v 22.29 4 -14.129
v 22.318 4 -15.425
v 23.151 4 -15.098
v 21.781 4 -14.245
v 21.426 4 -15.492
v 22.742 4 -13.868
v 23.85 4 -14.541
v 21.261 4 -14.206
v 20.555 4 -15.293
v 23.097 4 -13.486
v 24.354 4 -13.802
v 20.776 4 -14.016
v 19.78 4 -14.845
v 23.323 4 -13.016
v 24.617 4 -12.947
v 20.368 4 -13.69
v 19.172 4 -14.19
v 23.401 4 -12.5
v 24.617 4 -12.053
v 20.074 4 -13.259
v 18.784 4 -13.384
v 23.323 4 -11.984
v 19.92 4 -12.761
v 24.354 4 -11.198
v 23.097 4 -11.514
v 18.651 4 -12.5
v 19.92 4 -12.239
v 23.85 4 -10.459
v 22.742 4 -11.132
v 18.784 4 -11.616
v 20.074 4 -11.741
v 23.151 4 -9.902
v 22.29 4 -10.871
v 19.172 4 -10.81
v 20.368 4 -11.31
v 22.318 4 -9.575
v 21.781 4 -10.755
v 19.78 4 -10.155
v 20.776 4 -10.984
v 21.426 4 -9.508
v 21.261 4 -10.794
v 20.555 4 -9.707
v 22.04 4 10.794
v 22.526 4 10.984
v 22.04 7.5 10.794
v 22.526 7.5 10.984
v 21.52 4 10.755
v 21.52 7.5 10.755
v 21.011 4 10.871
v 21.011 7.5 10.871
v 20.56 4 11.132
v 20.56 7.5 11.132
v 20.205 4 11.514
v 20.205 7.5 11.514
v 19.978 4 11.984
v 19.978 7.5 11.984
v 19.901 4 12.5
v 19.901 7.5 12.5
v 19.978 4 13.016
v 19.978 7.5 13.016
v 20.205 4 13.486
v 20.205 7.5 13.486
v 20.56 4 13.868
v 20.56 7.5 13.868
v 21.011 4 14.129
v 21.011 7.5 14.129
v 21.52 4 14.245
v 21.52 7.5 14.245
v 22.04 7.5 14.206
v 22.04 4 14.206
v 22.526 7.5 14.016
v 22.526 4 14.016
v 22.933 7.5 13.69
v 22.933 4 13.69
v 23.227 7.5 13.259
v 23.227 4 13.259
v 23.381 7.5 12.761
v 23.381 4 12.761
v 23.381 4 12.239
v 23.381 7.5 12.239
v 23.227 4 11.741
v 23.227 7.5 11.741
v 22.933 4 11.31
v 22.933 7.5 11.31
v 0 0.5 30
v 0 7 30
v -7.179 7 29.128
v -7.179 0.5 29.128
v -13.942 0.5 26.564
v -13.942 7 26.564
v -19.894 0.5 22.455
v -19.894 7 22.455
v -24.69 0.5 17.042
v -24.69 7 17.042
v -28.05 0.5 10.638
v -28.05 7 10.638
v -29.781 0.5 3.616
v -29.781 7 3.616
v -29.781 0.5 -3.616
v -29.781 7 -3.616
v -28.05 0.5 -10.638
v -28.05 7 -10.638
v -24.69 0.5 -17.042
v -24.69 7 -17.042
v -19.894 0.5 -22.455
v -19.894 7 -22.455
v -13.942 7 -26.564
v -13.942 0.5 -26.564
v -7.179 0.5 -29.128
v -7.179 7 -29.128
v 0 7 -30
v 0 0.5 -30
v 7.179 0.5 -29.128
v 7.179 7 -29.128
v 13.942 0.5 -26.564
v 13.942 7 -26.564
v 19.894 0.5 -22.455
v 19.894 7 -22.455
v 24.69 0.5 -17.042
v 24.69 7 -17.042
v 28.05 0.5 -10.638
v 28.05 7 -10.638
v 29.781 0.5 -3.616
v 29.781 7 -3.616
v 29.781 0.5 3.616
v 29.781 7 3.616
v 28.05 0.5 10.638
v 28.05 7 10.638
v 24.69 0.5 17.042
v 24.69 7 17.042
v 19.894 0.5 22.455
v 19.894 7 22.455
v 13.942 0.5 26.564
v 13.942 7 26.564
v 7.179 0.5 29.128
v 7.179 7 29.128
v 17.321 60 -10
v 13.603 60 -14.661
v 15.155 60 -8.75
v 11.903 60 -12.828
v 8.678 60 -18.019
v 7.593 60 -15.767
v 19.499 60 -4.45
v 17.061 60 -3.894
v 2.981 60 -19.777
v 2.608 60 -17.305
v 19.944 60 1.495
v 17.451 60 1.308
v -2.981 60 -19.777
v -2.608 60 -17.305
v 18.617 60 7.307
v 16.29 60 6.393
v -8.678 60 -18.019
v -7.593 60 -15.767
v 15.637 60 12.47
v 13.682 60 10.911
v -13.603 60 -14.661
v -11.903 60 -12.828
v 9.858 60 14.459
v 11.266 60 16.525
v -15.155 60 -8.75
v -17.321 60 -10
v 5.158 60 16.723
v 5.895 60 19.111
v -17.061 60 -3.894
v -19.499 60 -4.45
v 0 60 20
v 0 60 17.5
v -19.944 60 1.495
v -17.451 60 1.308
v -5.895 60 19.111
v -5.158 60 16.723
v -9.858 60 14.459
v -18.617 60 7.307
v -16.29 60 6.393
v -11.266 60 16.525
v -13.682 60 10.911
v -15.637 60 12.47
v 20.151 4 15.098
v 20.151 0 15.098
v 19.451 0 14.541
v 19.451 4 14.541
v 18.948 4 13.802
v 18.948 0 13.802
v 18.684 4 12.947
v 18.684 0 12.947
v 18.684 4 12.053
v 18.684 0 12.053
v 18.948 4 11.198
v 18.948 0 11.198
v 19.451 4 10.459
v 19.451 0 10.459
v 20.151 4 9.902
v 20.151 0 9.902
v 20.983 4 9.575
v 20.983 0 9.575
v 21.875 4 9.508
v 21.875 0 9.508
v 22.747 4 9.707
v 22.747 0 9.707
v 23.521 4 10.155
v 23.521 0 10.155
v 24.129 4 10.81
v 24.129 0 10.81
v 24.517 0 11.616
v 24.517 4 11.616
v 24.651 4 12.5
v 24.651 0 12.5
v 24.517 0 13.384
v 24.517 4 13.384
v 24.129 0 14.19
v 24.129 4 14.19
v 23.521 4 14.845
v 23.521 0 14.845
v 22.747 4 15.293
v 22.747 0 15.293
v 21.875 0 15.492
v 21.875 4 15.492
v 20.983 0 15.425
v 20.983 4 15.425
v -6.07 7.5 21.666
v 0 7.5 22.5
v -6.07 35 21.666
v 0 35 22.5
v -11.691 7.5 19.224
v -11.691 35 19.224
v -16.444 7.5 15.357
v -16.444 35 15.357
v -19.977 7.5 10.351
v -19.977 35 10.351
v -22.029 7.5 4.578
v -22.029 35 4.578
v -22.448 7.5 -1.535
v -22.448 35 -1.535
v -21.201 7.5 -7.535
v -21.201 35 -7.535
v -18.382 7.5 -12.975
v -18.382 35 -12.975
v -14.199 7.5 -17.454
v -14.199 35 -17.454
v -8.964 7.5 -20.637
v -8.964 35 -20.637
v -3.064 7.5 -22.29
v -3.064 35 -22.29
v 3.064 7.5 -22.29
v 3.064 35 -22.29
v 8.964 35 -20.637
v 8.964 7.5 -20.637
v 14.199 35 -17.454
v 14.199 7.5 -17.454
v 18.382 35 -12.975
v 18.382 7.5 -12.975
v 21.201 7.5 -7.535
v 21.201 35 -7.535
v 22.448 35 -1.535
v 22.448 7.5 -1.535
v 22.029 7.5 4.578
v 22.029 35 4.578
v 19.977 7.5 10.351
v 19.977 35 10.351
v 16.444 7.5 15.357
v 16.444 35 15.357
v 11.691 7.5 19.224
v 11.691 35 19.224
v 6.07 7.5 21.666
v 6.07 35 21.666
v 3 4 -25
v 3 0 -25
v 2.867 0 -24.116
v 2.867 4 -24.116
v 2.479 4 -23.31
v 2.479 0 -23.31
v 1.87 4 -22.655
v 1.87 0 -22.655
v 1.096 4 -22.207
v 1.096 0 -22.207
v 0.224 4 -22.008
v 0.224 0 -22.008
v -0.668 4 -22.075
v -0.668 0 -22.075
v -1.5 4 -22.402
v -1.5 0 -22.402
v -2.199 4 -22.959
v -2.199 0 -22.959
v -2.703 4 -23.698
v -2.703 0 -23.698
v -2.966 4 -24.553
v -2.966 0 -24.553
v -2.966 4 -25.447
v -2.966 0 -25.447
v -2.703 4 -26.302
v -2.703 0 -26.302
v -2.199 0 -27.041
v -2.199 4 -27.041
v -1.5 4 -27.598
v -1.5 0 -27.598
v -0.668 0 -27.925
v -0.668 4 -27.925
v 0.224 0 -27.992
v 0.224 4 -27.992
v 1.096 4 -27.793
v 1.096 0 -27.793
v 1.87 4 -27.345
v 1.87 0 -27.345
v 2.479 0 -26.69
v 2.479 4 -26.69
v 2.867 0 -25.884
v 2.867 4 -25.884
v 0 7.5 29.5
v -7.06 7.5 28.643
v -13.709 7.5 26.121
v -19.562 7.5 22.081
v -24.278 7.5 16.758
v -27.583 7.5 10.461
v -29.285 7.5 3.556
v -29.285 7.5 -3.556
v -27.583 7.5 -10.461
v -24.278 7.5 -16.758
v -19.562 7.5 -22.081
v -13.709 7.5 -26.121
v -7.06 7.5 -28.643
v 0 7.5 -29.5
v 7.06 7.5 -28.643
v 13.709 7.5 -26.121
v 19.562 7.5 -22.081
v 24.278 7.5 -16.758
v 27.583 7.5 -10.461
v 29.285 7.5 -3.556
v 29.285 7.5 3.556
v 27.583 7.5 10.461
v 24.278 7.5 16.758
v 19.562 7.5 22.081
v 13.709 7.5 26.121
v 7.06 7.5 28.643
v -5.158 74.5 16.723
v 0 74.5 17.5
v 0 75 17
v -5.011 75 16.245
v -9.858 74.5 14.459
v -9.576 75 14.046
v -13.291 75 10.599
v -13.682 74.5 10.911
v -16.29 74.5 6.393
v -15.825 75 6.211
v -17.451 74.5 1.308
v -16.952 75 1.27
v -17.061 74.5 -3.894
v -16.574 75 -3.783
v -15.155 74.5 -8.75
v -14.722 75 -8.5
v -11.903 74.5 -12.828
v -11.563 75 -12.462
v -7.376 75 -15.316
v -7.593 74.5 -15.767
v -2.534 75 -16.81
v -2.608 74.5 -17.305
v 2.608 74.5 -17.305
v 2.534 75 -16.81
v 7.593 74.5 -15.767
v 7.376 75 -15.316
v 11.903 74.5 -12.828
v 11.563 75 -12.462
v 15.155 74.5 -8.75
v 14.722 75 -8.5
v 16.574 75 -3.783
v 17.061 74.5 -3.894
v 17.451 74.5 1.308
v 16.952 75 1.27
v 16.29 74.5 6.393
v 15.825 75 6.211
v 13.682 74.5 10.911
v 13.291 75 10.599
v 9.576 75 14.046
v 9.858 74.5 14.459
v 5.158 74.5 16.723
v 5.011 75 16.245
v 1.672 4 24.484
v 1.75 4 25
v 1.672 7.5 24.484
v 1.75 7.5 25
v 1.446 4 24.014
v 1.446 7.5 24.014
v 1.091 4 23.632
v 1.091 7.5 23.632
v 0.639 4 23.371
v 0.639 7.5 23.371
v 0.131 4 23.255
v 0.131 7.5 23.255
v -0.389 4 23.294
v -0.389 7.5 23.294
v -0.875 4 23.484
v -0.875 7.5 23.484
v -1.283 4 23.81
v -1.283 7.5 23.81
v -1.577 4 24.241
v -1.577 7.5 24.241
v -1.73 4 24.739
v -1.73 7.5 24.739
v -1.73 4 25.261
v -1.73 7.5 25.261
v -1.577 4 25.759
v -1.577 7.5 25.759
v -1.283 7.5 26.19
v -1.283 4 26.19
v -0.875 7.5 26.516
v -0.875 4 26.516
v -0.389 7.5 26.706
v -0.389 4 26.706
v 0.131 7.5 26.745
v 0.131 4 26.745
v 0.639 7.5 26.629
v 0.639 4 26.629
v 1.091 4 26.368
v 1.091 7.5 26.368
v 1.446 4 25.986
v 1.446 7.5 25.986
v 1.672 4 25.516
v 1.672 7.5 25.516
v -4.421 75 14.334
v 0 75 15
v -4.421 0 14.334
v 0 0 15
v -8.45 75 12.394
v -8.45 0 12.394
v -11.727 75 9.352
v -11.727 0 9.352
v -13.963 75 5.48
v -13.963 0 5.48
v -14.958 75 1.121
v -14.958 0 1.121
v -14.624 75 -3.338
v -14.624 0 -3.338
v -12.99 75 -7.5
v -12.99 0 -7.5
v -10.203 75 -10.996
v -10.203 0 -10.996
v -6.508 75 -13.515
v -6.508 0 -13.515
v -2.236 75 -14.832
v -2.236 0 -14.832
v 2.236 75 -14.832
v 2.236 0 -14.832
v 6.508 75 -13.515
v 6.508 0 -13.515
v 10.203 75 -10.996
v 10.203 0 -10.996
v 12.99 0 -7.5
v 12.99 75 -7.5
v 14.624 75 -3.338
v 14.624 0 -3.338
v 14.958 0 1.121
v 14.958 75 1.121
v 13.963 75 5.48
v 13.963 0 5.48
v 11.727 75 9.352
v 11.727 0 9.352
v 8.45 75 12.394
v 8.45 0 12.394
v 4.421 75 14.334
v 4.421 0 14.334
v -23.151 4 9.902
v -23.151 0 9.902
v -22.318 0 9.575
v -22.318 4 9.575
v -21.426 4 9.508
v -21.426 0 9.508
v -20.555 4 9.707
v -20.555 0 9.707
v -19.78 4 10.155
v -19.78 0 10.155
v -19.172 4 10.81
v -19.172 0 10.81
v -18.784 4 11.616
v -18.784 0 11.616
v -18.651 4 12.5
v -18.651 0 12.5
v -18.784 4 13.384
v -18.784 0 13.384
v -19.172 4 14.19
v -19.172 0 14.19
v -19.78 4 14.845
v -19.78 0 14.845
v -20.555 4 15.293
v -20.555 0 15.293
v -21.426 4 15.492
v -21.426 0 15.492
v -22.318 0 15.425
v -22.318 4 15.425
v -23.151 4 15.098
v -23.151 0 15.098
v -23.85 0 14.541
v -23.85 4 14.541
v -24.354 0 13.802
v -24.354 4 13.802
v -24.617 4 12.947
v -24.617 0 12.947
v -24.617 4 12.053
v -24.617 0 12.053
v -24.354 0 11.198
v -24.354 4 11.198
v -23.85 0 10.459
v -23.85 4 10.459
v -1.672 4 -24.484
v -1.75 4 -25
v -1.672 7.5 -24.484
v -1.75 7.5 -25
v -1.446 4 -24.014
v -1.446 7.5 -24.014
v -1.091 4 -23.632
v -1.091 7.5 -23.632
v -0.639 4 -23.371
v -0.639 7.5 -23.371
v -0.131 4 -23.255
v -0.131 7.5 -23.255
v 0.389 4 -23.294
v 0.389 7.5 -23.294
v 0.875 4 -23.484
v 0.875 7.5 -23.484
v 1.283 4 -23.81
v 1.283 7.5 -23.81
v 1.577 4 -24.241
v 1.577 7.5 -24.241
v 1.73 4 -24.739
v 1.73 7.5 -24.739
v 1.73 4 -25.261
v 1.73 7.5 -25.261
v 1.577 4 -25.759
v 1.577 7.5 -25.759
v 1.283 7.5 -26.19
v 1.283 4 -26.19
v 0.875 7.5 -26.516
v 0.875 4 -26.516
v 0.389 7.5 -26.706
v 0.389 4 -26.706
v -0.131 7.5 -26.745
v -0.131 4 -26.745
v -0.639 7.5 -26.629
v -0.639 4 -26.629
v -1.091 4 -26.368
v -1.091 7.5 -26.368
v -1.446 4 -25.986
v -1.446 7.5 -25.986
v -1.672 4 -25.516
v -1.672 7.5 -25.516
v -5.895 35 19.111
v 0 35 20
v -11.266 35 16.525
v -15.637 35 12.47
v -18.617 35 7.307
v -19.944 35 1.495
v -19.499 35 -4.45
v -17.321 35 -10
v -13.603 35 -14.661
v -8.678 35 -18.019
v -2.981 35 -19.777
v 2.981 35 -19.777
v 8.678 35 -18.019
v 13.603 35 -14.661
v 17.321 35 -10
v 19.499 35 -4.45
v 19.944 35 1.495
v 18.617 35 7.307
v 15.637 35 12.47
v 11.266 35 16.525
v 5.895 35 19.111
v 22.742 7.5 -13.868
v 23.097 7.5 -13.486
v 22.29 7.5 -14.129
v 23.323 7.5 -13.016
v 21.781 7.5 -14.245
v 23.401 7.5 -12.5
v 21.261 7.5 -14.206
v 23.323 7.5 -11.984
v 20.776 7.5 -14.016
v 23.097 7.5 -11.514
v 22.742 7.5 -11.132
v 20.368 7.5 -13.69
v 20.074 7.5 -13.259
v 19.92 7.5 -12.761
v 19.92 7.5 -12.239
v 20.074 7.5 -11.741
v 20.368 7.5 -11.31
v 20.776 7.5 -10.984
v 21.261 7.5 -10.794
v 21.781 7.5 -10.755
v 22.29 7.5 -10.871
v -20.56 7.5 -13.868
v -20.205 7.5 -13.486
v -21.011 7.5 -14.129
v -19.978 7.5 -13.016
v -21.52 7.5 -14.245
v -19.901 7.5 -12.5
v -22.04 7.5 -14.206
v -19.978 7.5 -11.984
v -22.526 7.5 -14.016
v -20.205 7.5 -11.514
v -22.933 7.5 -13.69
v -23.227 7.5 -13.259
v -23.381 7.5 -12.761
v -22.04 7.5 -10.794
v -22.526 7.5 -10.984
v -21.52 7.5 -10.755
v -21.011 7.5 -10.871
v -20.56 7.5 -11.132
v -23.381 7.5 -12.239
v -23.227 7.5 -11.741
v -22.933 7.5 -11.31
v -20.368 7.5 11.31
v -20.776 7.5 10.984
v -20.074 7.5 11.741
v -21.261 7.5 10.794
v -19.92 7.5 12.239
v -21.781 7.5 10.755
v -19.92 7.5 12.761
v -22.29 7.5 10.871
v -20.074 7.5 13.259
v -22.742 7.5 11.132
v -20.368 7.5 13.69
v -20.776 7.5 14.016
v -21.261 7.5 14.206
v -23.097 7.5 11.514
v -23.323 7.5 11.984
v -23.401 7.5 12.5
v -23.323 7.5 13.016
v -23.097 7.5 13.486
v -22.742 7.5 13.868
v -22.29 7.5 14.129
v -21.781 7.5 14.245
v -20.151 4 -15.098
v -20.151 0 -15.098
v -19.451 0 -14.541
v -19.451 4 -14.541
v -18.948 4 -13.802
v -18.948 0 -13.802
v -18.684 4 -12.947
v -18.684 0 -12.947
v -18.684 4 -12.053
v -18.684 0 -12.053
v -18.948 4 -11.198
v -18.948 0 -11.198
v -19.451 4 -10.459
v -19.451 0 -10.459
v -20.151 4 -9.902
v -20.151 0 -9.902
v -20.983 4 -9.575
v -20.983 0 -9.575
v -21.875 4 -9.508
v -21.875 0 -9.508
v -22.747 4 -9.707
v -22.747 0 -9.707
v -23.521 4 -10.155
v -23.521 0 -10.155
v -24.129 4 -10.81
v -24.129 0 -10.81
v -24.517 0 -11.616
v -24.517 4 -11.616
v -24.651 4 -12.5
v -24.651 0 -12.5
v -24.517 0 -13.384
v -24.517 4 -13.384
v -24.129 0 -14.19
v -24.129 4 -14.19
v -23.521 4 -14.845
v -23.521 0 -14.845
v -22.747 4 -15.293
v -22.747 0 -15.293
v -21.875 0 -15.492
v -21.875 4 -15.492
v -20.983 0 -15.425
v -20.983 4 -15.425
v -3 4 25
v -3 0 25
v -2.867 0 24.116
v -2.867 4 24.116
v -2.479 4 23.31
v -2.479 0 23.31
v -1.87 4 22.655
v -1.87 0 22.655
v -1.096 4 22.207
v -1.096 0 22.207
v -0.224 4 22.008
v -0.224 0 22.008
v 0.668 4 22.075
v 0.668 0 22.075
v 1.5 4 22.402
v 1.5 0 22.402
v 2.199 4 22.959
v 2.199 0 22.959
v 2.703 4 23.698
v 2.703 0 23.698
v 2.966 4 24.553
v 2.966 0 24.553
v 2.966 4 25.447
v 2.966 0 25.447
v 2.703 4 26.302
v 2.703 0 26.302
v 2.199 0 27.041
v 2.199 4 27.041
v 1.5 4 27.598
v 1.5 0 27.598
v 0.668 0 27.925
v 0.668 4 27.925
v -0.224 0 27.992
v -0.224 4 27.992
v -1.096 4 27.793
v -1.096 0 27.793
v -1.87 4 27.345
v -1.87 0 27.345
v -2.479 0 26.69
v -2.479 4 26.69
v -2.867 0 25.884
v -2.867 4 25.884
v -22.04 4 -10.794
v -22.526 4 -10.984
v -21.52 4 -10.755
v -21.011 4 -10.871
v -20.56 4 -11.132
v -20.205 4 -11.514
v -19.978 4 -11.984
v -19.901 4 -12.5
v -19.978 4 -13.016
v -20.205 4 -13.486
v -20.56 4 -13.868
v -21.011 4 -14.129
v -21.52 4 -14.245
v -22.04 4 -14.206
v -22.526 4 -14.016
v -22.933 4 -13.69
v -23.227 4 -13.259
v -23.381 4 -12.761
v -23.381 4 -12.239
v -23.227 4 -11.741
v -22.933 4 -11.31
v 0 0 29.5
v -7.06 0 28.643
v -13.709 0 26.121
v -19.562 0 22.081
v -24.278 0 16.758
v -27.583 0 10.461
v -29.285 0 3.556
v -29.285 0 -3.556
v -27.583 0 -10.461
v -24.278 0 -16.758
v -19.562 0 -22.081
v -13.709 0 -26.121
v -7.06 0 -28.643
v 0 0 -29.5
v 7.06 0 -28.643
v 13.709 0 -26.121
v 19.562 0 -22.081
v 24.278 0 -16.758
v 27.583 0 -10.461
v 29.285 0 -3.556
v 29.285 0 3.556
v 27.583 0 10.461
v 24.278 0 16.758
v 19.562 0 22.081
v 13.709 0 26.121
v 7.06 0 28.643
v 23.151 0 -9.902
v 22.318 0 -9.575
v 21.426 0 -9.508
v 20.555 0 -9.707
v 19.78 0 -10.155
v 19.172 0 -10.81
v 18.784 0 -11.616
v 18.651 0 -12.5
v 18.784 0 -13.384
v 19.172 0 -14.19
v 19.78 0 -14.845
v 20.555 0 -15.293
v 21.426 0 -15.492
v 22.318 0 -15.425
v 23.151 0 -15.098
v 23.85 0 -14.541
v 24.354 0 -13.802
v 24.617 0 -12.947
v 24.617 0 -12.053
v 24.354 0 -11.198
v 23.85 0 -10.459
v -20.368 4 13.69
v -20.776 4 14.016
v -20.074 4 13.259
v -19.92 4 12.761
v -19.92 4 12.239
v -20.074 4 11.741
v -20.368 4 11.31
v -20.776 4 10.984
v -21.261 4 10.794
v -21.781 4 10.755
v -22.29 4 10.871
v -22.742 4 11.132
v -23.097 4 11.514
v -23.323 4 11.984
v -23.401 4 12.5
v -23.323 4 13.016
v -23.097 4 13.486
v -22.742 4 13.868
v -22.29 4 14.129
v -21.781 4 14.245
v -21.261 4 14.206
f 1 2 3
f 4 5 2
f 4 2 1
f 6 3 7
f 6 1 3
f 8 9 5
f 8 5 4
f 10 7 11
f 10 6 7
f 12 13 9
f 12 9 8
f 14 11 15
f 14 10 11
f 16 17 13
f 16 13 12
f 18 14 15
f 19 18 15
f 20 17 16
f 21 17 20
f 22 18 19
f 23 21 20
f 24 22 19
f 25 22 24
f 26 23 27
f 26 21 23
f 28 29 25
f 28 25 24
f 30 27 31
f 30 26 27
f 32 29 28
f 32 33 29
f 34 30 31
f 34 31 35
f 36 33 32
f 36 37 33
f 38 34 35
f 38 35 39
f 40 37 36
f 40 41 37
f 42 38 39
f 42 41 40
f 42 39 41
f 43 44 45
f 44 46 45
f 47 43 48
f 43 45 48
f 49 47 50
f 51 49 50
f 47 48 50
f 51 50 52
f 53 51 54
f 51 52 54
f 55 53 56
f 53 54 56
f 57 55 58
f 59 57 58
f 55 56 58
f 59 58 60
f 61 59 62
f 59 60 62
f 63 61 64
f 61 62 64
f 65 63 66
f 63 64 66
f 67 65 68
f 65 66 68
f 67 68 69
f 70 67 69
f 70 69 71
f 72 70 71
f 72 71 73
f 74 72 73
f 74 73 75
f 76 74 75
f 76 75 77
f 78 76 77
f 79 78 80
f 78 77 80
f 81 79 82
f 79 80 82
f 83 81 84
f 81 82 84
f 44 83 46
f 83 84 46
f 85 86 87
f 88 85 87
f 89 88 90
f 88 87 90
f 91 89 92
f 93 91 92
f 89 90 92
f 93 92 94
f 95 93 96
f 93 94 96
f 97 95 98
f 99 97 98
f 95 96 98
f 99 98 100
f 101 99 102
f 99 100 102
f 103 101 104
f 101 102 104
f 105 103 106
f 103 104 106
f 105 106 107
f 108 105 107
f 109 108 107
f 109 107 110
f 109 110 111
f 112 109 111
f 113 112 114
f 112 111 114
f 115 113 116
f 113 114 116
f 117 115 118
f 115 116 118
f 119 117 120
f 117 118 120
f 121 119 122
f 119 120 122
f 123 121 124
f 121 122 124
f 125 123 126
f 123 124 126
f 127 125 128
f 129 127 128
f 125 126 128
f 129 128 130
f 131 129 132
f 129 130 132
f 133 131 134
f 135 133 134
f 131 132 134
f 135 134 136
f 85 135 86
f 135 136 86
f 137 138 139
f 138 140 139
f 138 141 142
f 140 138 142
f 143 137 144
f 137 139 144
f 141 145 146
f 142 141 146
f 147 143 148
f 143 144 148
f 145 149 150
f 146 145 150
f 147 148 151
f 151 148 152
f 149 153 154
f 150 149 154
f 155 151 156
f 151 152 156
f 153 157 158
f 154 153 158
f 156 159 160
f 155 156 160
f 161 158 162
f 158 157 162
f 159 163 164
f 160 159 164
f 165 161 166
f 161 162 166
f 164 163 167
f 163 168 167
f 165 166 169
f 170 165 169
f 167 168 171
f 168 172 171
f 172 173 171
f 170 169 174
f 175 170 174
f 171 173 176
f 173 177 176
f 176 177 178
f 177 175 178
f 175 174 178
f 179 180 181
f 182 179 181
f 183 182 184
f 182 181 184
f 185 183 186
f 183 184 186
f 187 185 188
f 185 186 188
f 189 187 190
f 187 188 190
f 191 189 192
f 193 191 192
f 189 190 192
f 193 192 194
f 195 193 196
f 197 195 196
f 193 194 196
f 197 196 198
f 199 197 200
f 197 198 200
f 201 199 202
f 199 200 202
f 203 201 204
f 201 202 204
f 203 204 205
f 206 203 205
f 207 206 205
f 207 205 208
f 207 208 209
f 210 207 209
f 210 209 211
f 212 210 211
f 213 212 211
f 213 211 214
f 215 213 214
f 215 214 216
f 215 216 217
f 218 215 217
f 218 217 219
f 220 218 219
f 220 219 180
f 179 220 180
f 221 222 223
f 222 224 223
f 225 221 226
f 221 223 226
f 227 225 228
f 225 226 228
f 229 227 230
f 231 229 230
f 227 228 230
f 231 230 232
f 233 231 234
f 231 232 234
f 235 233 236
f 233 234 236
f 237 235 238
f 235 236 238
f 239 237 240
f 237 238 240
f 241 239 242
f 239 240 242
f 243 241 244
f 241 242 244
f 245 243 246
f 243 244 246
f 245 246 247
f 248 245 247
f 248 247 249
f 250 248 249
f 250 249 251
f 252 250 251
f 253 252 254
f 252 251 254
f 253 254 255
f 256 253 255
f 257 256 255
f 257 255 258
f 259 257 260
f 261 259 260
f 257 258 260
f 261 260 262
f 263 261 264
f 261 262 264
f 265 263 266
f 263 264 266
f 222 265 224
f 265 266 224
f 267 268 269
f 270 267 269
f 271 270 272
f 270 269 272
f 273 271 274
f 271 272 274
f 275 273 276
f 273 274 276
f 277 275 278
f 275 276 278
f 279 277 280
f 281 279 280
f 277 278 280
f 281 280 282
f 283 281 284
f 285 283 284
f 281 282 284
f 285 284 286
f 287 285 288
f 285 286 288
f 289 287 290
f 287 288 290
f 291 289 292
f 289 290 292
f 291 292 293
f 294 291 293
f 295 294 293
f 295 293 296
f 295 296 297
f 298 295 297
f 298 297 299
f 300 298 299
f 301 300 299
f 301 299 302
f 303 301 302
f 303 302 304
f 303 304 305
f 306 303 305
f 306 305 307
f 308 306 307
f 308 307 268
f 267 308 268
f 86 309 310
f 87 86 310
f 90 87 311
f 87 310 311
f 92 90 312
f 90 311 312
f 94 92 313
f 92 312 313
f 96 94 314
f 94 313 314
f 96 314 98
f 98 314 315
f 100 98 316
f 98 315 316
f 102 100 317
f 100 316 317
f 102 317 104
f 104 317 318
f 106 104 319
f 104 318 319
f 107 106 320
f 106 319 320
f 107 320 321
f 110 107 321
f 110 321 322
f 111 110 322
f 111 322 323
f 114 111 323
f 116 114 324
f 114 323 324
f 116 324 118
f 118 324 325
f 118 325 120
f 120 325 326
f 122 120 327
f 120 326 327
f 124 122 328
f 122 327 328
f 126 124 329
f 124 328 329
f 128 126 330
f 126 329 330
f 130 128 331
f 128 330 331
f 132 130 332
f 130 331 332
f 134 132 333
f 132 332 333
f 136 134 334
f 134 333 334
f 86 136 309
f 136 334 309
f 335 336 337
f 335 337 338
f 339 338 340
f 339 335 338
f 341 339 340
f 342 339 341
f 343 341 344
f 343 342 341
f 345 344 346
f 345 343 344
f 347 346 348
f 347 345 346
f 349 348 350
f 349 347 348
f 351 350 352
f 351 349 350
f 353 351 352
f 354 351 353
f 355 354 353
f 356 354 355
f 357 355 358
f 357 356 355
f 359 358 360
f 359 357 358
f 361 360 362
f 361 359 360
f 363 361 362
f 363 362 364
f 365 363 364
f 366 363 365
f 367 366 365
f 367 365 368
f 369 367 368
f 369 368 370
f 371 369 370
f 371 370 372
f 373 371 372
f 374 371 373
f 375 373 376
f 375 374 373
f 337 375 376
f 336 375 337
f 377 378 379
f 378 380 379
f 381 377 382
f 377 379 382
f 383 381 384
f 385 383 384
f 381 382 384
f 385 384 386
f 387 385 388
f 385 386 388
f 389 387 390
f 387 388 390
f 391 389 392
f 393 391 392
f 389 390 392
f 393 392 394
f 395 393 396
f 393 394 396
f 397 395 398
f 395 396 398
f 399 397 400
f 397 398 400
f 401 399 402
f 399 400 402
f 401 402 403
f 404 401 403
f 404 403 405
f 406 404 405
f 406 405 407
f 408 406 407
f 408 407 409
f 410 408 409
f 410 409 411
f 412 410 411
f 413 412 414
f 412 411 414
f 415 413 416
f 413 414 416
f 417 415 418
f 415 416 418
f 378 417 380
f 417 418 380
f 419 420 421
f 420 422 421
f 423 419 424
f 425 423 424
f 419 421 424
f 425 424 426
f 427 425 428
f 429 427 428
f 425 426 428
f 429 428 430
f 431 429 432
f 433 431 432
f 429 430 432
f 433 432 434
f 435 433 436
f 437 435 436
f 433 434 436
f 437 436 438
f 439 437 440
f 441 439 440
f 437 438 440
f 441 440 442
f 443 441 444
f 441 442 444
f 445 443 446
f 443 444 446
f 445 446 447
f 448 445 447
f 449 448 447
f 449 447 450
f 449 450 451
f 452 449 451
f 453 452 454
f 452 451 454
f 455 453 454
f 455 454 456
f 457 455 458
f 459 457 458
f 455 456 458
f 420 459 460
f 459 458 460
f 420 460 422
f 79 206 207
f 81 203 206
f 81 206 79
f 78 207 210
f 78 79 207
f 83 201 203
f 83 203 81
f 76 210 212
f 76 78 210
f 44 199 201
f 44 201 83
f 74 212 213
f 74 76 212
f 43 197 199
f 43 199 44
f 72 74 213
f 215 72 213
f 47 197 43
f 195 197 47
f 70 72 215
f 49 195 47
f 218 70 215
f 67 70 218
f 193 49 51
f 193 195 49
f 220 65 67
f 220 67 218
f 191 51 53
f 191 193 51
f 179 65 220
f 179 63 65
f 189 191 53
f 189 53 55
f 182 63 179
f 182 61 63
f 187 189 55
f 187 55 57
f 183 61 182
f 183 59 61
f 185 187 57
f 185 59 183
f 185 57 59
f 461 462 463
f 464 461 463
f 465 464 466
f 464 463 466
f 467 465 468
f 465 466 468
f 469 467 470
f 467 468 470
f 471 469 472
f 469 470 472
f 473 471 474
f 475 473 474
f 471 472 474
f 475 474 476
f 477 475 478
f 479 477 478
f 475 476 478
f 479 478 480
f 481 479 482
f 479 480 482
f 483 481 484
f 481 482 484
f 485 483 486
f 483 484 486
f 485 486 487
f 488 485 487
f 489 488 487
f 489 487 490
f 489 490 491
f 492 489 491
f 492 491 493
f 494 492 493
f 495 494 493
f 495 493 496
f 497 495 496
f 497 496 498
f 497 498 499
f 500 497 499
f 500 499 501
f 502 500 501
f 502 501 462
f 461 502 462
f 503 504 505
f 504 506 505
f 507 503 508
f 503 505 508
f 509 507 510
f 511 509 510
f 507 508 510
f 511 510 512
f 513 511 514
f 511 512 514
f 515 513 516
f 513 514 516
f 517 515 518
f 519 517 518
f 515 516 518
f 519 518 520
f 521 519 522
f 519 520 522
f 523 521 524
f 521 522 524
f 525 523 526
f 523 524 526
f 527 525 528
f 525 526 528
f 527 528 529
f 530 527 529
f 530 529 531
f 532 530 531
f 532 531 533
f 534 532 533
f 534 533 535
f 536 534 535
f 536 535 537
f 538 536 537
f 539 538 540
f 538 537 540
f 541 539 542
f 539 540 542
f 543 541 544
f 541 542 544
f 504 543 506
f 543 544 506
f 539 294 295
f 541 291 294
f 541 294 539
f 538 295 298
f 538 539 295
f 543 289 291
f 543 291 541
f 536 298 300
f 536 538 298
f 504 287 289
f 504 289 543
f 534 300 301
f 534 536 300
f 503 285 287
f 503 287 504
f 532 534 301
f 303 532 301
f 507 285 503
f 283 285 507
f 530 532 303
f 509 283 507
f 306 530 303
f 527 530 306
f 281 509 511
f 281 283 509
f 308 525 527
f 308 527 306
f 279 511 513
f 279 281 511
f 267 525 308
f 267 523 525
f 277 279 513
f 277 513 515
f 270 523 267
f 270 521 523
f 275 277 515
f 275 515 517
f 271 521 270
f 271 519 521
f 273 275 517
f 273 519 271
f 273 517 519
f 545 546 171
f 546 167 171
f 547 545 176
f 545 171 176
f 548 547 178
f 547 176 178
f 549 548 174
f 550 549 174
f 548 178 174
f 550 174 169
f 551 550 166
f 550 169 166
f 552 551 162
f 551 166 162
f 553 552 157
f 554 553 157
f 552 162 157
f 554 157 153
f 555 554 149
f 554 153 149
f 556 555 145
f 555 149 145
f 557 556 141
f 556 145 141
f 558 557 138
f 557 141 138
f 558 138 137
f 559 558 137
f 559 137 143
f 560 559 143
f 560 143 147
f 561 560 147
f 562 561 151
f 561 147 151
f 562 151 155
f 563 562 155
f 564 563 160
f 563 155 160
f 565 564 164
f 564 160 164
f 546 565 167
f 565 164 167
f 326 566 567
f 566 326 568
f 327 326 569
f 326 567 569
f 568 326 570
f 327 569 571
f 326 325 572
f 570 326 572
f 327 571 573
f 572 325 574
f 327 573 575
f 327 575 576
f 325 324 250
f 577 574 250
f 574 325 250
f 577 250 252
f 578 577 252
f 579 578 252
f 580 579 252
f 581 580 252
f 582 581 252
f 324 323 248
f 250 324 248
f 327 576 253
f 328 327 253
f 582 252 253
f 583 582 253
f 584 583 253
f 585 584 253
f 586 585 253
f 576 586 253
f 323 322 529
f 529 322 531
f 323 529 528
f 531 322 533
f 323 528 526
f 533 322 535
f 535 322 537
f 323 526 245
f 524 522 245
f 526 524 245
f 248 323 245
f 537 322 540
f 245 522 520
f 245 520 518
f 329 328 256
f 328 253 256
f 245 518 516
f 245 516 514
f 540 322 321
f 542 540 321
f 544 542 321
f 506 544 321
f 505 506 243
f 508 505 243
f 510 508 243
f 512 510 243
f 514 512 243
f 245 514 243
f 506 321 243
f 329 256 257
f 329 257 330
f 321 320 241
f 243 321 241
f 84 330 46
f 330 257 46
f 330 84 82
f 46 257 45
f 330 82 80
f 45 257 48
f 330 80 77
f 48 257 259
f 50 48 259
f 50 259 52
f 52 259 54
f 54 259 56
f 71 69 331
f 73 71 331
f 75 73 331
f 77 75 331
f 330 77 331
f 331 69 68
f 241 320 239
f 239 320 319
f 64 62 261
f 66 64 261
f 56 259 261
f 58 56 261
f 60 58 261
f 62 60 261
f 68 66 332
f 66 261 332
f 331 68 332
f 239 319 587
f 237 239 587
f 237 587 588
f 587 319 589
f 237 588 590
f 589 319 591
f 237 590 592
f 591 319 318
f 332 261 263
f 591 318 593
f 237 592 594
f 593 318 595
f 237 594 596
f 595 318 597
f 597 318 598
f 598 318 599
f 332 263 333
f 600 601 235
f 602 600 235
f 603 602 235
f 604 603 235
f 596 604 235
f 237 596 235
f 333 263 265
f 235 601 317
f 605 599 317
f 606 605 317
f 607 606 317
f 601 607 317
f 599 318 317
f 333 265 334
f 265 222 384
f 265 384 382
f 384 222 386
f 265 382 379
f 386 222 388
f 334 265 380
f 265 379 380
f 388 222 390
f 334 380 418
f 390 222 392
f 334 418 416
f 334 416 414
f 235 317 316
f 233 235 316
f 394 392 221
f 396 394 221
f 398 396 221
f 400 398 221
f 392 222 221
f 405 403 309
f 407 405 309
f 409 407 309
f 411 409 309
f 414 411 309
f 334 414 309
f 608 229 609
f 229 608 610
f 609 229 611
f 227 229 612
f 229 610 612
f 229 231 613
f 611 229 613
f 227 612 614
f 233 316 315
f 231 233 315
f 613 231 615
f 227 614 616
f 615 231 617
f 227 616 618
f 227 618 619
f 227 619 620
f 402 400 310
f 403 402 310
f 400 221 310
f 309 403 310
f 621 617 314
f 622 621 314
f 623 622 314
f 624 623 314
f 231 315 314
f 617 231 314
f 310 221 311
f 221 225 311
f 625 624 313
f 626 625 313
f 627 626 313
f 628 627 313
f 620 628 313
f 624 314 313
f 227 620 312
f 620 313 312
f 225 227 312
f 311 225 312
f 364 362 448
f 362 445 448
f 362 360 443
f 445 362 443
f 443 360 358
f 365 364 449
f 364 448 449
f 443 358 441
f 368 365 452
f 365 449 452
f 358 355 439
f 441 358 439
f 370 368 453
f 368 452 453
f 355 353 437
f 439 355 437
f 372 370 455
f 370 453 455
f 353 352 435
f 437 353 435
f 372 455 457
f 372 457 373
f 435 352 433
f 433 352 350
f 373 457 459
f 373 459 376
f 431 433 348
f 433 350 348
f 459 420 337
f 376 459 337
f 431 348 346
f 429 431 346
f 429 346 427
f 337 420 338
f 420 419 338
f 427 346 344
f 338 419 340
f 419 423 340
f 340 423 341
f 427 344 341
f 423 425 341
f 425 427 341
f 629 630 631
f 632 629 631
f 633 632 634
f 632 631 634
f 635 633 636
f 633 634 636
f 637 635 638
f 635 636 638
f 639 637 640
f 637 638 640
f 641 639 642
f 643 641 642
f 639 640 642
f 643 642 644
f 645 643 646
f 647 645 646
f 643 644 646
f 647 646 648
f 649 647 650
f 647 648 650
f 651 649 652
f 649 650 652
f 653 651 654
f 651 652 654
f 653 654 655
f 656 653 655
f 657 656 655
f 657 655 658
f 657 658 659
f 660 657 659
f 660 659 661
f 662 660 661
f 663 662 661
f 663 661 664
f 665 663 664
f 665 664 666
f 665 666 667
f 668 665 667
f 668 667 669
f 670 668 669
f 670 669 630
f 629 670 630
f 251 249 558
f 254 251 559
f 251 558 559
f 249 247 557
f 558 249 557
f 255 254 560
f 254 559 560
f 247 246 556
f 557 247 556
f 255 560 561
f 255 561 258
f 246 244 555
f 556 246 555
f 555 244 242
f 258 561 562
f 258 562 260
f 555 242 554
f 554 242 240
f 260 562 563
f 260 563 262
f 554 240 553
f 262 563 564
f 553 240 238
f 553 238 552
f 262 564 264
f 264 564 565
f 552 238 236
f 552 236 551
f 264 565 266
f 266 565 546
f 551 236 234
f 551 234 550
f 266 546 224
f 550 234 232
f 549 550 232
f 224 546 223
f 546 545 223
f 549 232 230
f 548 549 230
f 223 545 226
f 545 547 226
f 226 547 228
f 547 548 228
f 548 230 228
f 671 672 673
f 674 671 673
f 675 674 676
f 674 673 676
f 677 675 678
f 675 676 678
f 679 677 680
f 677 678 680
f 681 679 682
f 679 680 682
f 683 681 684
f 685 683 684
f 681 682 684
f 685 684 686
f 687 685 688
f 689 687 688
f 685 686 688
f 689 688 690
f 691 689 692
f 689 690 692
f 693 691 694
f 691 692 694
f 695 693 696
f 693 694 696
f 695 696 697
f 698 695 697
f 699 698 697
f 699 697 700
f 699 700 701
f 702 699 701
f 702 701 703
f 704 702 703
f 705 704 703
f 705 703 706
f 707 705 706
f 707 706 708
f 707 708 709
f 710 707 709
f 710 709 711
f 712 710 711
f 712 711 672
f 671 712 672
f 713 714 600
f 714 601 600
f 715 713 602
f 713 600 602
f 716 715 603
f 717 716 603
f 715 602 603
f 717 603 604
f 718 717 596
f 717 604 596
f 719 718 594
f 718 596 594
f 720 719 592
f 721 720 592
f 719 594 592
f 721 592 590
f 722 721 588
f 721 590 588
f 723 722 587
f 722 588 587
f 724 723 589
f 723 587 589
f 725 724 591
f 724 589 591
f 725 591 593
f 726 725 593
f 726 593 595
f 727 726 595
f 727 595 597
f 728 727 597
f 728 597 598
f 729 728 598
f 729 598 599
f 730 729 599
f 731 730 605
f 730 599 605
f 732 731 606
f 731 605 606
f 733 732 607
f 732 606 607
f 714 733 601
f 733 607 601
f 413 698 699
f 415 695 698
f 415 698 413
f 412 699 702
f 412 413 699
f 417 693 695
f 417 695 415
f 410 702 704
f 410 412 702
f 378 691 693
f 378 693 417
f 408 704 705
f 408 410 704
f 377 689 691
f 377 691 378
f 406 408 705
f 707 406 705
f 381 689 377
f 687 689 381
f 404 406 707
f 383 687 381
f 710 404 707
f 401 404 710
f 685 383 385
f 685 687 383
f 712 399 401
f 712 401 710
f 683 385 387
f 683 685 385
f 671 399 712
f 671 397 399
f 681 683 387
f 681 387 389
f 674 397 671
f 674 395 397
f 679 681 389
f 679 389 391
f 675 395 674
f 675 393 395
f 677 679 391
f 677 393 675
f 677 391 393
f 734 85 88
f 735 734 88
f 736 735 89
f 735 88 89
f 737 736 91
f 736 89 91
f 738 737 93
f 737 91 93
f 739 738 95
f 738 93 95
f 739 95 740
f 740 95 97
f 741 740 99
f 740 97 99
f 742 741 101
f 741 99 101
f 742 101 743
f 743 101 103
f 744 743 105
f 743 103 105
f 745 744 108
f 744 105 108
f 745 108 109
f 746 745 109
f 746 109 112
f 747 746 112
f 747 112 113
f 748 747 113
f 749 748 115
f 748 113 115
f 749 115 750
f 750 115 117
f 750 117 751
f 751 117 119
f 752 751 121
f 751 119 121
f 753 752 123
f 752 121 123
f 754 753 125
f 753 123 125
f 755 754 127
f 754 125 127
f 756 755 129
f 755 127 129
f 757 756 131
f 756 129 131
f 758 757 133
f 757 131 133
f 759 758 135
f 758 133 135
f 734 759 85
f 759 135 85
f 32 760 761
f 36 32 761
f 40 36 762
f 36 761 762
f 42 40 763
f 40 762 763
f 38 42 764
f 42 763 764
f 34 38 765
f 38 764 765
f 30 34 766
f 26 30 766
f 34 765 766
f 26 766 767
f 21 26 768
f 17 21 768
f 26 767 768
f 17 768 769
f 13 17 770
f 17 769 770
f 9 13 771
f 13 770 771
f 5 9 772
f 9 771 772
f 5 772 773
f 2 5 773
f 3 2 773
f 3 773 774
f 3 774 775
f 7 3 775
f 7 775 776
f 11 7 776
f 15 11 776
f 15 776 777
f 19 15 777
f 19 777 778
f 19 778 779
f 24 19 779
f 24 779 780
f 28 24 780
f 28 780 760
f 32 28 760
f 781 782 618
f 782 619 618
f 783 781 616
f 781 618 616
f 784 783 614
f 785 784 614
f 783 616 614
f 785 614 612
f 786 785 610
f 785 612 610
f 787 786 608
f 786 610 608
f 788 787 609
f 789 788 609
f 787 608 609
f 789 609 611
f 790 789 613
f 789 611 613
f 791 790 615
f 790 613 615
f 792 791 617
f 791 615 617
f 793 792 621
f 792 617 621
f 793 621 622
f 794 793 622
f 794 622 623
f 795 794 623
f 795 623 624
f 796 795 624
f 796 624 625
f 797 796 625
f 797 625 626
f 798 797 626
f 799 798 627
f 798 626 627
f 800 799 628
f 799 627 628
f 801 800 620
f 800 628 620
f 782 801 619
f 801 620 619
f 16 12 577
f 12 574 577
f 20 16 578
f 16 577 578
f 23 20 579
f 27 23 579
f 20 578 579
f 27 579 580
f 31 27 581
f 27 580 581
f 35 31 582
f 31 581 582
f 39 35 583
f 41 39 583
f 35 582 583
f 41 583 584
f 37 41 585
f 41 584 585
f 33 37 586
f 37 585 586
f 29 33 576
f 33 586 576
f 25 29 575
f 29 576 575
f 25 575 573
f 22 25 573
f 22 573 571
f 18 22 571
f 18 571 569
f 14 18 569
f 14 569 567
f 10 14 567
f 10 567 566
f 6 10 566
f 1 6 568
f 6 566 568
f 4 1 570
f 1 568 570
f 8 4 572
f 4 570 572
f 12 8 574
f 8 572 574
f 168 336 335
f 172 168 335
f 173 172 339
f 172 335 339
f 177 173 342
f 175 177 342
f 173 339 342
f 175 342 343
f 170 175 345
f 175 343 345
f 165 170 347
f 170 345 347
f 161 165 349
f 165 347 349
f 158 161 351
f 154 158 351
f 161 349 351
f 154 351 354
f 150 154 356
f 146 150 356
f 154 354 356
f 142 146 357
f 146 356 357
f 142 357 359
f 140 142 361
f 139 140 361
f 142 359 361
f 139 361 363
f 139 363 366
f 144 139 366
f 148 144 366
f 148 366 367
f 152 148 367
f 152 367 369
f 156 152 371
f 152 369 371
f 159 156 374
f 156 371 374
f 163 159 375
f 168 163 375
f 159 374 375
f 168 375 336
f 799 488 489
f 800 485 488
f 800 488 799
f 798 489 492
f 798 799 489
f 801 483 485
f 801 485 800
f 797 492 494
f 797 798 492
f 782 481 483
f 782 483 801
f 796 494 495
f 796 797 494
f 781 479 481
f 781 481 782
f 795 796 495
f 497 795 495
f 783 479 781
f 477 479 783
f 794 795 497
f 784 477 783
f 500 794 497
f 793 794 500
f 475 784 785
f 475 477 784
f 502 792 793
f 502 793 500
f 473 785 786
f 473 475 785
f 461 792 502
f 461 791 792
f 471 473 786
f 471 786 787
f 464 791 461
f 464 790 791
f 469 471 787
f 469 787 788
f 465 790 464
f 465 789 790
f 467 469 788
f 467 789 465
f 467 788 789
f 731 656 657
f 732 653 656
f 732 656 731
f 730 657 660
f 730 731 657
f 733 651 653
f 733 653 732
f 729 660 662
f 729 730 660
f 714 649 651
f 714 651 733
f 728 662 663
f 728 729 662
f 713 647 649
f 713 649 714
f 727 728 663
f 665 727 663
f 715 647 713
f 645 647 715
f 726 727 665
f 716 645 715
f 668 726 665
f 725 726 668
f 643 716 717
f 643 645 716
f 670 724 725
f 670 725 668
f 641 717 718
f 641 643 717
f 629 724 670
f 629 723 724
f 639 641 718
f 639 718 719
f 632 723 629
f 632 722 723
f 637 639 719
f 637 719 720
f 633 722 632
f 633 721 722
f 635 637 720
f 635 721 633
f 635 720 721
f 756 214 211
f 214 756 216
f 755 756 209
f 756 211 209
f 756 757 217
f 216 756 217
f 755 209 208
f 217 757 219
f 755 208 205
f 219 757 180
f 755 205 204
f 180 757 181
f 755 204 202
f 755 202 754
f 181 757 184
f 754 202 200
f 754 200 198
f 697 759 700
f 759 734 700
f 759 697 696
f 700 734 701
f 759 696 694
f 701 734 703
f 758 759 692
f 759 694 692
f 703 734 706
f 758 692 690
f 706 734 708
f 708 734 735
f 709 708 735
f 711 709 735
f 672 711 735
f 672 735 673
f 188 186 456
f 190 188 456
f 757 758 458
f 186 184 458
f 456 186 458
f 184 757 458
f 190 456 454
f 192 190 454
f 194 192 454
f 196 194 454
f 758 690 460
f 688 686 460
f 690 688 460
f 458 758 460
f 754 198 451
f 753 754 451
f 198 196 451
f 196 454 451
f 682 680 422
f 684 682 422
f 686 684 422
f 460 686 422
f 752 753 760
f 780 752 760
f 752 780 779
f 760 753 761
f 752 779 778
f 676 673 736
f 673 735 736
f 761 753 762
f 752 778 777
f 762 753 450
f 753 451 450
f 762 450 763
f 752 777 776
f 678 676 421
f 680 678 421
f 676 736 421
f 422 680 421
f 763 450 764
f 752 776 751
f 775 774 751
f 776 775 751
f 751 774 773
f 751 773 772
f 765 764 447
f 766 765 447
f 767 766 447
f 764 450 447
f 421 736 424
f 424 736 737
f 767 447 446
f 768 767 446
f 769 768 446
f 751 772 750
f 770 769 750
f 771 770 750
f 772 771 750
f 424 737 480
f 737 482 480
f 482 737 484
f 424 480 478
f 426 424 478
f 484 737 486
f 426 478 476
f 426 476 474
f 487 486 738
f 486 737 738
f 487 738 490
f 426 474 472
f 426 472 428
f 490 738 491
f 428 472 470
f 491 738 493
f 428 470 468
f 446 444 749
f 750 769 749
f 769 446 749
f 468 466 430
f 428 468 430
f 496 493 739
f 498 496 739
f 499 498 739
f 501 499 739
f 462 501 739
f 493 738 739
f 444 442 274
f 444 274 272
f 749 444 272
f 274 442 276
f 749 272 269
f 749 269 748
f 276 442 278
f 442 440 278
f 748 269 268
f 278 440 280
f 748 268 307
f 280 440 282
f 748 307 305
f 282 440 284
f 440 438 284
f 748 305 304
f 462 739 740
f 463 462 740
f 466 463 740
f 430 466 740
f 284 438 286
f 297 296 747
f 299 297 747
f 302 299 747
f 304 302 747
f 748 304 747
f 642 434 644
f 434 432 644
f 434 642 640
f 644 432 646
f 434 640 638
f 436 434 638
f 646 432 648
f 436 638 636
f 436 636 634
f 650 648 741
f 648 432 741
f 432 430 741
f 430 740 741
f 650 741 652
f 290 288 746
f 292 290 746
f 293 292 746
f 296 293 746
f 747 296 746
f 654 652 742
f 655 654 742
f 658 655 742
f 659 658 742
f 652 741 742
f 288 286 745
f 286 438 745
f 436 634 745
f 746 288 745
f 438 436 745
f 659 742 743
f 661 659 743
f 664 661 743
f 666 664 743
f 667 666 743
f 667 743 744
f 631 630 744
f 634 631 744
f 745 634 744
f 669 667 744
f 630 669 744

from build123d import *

# Parameters (mm, degrees)
HOLE_WIZARD_1_D           = 3.5
HOLE_WIZARD_1_CBORE_D     = 6
HOLE_WIZARD_1_CBORE_DEPTH = 4
PATTERN_CIRCULAR_1_COUNT  = 6
CHAMFER_1_SIZE            = 0.5


with BuildPart() as part:
    # 草图1 → 旋转1 (revolve)
    with BuildSketch(Plane(origin=(0, 0, 0), x_dir=(0, 0, -1), z_dir=(1, 0, 0))):
        Polygon((-15, 75), (-15, 0), (-30, 0), (-30, 7.5), (-22.5, 7.5), (-22.5, 35), (-20, 35), (-20, 60), (-17.5, 60), (-17.5, 75), align=None)
    revolve(axis=Axis((0, 44, 0), (0, -1, 0)))

    # 打孔尺寸(%根据)内六角圆柱头螺钉的类型1 (through all)
    with Locations(Plane(origin=(0, 0, 0), x_dir=(-1, 0, 0), z_dir=(0, -1, 0))):
        with Locations((0, -25)):
            hole_wizard_1 = CounterBoreHole(HOLE_WIZARD_1_D / 2, HOLE_WIZARD_1_CBORE_D / 2, HOLE_WIZARD_1_CBORE_DEPTH)

    # 阵列(圆周)1: 打孔尺寸(%根据)内六角圆柱头螺钉的类型1 ×6 about axis
    pattern_circular_1_axis = Axis((0, 0, 0), (0, 1, 0))
    for i in range(1, PATTERN_CIRCULAR_1_COUNT):
        add(hole_wizard_1.rotate(pattern_circular_1_axis, i * 360 / PATTERN_CIRCULAR_1_COUNT), mode=Mode.SUBTRACT)

    # 倒角1
    chamfer_1_edges = [part.edges().sort_by_distance(p)[0] for p in [
        (0, 7.5, -30),
        (0, 0, -30),
        (0, 75, -17.5),
    ]]
    chamfer(chamfer_1_edges, length=CHAMFER_1_SIZE)


solid = part.part
